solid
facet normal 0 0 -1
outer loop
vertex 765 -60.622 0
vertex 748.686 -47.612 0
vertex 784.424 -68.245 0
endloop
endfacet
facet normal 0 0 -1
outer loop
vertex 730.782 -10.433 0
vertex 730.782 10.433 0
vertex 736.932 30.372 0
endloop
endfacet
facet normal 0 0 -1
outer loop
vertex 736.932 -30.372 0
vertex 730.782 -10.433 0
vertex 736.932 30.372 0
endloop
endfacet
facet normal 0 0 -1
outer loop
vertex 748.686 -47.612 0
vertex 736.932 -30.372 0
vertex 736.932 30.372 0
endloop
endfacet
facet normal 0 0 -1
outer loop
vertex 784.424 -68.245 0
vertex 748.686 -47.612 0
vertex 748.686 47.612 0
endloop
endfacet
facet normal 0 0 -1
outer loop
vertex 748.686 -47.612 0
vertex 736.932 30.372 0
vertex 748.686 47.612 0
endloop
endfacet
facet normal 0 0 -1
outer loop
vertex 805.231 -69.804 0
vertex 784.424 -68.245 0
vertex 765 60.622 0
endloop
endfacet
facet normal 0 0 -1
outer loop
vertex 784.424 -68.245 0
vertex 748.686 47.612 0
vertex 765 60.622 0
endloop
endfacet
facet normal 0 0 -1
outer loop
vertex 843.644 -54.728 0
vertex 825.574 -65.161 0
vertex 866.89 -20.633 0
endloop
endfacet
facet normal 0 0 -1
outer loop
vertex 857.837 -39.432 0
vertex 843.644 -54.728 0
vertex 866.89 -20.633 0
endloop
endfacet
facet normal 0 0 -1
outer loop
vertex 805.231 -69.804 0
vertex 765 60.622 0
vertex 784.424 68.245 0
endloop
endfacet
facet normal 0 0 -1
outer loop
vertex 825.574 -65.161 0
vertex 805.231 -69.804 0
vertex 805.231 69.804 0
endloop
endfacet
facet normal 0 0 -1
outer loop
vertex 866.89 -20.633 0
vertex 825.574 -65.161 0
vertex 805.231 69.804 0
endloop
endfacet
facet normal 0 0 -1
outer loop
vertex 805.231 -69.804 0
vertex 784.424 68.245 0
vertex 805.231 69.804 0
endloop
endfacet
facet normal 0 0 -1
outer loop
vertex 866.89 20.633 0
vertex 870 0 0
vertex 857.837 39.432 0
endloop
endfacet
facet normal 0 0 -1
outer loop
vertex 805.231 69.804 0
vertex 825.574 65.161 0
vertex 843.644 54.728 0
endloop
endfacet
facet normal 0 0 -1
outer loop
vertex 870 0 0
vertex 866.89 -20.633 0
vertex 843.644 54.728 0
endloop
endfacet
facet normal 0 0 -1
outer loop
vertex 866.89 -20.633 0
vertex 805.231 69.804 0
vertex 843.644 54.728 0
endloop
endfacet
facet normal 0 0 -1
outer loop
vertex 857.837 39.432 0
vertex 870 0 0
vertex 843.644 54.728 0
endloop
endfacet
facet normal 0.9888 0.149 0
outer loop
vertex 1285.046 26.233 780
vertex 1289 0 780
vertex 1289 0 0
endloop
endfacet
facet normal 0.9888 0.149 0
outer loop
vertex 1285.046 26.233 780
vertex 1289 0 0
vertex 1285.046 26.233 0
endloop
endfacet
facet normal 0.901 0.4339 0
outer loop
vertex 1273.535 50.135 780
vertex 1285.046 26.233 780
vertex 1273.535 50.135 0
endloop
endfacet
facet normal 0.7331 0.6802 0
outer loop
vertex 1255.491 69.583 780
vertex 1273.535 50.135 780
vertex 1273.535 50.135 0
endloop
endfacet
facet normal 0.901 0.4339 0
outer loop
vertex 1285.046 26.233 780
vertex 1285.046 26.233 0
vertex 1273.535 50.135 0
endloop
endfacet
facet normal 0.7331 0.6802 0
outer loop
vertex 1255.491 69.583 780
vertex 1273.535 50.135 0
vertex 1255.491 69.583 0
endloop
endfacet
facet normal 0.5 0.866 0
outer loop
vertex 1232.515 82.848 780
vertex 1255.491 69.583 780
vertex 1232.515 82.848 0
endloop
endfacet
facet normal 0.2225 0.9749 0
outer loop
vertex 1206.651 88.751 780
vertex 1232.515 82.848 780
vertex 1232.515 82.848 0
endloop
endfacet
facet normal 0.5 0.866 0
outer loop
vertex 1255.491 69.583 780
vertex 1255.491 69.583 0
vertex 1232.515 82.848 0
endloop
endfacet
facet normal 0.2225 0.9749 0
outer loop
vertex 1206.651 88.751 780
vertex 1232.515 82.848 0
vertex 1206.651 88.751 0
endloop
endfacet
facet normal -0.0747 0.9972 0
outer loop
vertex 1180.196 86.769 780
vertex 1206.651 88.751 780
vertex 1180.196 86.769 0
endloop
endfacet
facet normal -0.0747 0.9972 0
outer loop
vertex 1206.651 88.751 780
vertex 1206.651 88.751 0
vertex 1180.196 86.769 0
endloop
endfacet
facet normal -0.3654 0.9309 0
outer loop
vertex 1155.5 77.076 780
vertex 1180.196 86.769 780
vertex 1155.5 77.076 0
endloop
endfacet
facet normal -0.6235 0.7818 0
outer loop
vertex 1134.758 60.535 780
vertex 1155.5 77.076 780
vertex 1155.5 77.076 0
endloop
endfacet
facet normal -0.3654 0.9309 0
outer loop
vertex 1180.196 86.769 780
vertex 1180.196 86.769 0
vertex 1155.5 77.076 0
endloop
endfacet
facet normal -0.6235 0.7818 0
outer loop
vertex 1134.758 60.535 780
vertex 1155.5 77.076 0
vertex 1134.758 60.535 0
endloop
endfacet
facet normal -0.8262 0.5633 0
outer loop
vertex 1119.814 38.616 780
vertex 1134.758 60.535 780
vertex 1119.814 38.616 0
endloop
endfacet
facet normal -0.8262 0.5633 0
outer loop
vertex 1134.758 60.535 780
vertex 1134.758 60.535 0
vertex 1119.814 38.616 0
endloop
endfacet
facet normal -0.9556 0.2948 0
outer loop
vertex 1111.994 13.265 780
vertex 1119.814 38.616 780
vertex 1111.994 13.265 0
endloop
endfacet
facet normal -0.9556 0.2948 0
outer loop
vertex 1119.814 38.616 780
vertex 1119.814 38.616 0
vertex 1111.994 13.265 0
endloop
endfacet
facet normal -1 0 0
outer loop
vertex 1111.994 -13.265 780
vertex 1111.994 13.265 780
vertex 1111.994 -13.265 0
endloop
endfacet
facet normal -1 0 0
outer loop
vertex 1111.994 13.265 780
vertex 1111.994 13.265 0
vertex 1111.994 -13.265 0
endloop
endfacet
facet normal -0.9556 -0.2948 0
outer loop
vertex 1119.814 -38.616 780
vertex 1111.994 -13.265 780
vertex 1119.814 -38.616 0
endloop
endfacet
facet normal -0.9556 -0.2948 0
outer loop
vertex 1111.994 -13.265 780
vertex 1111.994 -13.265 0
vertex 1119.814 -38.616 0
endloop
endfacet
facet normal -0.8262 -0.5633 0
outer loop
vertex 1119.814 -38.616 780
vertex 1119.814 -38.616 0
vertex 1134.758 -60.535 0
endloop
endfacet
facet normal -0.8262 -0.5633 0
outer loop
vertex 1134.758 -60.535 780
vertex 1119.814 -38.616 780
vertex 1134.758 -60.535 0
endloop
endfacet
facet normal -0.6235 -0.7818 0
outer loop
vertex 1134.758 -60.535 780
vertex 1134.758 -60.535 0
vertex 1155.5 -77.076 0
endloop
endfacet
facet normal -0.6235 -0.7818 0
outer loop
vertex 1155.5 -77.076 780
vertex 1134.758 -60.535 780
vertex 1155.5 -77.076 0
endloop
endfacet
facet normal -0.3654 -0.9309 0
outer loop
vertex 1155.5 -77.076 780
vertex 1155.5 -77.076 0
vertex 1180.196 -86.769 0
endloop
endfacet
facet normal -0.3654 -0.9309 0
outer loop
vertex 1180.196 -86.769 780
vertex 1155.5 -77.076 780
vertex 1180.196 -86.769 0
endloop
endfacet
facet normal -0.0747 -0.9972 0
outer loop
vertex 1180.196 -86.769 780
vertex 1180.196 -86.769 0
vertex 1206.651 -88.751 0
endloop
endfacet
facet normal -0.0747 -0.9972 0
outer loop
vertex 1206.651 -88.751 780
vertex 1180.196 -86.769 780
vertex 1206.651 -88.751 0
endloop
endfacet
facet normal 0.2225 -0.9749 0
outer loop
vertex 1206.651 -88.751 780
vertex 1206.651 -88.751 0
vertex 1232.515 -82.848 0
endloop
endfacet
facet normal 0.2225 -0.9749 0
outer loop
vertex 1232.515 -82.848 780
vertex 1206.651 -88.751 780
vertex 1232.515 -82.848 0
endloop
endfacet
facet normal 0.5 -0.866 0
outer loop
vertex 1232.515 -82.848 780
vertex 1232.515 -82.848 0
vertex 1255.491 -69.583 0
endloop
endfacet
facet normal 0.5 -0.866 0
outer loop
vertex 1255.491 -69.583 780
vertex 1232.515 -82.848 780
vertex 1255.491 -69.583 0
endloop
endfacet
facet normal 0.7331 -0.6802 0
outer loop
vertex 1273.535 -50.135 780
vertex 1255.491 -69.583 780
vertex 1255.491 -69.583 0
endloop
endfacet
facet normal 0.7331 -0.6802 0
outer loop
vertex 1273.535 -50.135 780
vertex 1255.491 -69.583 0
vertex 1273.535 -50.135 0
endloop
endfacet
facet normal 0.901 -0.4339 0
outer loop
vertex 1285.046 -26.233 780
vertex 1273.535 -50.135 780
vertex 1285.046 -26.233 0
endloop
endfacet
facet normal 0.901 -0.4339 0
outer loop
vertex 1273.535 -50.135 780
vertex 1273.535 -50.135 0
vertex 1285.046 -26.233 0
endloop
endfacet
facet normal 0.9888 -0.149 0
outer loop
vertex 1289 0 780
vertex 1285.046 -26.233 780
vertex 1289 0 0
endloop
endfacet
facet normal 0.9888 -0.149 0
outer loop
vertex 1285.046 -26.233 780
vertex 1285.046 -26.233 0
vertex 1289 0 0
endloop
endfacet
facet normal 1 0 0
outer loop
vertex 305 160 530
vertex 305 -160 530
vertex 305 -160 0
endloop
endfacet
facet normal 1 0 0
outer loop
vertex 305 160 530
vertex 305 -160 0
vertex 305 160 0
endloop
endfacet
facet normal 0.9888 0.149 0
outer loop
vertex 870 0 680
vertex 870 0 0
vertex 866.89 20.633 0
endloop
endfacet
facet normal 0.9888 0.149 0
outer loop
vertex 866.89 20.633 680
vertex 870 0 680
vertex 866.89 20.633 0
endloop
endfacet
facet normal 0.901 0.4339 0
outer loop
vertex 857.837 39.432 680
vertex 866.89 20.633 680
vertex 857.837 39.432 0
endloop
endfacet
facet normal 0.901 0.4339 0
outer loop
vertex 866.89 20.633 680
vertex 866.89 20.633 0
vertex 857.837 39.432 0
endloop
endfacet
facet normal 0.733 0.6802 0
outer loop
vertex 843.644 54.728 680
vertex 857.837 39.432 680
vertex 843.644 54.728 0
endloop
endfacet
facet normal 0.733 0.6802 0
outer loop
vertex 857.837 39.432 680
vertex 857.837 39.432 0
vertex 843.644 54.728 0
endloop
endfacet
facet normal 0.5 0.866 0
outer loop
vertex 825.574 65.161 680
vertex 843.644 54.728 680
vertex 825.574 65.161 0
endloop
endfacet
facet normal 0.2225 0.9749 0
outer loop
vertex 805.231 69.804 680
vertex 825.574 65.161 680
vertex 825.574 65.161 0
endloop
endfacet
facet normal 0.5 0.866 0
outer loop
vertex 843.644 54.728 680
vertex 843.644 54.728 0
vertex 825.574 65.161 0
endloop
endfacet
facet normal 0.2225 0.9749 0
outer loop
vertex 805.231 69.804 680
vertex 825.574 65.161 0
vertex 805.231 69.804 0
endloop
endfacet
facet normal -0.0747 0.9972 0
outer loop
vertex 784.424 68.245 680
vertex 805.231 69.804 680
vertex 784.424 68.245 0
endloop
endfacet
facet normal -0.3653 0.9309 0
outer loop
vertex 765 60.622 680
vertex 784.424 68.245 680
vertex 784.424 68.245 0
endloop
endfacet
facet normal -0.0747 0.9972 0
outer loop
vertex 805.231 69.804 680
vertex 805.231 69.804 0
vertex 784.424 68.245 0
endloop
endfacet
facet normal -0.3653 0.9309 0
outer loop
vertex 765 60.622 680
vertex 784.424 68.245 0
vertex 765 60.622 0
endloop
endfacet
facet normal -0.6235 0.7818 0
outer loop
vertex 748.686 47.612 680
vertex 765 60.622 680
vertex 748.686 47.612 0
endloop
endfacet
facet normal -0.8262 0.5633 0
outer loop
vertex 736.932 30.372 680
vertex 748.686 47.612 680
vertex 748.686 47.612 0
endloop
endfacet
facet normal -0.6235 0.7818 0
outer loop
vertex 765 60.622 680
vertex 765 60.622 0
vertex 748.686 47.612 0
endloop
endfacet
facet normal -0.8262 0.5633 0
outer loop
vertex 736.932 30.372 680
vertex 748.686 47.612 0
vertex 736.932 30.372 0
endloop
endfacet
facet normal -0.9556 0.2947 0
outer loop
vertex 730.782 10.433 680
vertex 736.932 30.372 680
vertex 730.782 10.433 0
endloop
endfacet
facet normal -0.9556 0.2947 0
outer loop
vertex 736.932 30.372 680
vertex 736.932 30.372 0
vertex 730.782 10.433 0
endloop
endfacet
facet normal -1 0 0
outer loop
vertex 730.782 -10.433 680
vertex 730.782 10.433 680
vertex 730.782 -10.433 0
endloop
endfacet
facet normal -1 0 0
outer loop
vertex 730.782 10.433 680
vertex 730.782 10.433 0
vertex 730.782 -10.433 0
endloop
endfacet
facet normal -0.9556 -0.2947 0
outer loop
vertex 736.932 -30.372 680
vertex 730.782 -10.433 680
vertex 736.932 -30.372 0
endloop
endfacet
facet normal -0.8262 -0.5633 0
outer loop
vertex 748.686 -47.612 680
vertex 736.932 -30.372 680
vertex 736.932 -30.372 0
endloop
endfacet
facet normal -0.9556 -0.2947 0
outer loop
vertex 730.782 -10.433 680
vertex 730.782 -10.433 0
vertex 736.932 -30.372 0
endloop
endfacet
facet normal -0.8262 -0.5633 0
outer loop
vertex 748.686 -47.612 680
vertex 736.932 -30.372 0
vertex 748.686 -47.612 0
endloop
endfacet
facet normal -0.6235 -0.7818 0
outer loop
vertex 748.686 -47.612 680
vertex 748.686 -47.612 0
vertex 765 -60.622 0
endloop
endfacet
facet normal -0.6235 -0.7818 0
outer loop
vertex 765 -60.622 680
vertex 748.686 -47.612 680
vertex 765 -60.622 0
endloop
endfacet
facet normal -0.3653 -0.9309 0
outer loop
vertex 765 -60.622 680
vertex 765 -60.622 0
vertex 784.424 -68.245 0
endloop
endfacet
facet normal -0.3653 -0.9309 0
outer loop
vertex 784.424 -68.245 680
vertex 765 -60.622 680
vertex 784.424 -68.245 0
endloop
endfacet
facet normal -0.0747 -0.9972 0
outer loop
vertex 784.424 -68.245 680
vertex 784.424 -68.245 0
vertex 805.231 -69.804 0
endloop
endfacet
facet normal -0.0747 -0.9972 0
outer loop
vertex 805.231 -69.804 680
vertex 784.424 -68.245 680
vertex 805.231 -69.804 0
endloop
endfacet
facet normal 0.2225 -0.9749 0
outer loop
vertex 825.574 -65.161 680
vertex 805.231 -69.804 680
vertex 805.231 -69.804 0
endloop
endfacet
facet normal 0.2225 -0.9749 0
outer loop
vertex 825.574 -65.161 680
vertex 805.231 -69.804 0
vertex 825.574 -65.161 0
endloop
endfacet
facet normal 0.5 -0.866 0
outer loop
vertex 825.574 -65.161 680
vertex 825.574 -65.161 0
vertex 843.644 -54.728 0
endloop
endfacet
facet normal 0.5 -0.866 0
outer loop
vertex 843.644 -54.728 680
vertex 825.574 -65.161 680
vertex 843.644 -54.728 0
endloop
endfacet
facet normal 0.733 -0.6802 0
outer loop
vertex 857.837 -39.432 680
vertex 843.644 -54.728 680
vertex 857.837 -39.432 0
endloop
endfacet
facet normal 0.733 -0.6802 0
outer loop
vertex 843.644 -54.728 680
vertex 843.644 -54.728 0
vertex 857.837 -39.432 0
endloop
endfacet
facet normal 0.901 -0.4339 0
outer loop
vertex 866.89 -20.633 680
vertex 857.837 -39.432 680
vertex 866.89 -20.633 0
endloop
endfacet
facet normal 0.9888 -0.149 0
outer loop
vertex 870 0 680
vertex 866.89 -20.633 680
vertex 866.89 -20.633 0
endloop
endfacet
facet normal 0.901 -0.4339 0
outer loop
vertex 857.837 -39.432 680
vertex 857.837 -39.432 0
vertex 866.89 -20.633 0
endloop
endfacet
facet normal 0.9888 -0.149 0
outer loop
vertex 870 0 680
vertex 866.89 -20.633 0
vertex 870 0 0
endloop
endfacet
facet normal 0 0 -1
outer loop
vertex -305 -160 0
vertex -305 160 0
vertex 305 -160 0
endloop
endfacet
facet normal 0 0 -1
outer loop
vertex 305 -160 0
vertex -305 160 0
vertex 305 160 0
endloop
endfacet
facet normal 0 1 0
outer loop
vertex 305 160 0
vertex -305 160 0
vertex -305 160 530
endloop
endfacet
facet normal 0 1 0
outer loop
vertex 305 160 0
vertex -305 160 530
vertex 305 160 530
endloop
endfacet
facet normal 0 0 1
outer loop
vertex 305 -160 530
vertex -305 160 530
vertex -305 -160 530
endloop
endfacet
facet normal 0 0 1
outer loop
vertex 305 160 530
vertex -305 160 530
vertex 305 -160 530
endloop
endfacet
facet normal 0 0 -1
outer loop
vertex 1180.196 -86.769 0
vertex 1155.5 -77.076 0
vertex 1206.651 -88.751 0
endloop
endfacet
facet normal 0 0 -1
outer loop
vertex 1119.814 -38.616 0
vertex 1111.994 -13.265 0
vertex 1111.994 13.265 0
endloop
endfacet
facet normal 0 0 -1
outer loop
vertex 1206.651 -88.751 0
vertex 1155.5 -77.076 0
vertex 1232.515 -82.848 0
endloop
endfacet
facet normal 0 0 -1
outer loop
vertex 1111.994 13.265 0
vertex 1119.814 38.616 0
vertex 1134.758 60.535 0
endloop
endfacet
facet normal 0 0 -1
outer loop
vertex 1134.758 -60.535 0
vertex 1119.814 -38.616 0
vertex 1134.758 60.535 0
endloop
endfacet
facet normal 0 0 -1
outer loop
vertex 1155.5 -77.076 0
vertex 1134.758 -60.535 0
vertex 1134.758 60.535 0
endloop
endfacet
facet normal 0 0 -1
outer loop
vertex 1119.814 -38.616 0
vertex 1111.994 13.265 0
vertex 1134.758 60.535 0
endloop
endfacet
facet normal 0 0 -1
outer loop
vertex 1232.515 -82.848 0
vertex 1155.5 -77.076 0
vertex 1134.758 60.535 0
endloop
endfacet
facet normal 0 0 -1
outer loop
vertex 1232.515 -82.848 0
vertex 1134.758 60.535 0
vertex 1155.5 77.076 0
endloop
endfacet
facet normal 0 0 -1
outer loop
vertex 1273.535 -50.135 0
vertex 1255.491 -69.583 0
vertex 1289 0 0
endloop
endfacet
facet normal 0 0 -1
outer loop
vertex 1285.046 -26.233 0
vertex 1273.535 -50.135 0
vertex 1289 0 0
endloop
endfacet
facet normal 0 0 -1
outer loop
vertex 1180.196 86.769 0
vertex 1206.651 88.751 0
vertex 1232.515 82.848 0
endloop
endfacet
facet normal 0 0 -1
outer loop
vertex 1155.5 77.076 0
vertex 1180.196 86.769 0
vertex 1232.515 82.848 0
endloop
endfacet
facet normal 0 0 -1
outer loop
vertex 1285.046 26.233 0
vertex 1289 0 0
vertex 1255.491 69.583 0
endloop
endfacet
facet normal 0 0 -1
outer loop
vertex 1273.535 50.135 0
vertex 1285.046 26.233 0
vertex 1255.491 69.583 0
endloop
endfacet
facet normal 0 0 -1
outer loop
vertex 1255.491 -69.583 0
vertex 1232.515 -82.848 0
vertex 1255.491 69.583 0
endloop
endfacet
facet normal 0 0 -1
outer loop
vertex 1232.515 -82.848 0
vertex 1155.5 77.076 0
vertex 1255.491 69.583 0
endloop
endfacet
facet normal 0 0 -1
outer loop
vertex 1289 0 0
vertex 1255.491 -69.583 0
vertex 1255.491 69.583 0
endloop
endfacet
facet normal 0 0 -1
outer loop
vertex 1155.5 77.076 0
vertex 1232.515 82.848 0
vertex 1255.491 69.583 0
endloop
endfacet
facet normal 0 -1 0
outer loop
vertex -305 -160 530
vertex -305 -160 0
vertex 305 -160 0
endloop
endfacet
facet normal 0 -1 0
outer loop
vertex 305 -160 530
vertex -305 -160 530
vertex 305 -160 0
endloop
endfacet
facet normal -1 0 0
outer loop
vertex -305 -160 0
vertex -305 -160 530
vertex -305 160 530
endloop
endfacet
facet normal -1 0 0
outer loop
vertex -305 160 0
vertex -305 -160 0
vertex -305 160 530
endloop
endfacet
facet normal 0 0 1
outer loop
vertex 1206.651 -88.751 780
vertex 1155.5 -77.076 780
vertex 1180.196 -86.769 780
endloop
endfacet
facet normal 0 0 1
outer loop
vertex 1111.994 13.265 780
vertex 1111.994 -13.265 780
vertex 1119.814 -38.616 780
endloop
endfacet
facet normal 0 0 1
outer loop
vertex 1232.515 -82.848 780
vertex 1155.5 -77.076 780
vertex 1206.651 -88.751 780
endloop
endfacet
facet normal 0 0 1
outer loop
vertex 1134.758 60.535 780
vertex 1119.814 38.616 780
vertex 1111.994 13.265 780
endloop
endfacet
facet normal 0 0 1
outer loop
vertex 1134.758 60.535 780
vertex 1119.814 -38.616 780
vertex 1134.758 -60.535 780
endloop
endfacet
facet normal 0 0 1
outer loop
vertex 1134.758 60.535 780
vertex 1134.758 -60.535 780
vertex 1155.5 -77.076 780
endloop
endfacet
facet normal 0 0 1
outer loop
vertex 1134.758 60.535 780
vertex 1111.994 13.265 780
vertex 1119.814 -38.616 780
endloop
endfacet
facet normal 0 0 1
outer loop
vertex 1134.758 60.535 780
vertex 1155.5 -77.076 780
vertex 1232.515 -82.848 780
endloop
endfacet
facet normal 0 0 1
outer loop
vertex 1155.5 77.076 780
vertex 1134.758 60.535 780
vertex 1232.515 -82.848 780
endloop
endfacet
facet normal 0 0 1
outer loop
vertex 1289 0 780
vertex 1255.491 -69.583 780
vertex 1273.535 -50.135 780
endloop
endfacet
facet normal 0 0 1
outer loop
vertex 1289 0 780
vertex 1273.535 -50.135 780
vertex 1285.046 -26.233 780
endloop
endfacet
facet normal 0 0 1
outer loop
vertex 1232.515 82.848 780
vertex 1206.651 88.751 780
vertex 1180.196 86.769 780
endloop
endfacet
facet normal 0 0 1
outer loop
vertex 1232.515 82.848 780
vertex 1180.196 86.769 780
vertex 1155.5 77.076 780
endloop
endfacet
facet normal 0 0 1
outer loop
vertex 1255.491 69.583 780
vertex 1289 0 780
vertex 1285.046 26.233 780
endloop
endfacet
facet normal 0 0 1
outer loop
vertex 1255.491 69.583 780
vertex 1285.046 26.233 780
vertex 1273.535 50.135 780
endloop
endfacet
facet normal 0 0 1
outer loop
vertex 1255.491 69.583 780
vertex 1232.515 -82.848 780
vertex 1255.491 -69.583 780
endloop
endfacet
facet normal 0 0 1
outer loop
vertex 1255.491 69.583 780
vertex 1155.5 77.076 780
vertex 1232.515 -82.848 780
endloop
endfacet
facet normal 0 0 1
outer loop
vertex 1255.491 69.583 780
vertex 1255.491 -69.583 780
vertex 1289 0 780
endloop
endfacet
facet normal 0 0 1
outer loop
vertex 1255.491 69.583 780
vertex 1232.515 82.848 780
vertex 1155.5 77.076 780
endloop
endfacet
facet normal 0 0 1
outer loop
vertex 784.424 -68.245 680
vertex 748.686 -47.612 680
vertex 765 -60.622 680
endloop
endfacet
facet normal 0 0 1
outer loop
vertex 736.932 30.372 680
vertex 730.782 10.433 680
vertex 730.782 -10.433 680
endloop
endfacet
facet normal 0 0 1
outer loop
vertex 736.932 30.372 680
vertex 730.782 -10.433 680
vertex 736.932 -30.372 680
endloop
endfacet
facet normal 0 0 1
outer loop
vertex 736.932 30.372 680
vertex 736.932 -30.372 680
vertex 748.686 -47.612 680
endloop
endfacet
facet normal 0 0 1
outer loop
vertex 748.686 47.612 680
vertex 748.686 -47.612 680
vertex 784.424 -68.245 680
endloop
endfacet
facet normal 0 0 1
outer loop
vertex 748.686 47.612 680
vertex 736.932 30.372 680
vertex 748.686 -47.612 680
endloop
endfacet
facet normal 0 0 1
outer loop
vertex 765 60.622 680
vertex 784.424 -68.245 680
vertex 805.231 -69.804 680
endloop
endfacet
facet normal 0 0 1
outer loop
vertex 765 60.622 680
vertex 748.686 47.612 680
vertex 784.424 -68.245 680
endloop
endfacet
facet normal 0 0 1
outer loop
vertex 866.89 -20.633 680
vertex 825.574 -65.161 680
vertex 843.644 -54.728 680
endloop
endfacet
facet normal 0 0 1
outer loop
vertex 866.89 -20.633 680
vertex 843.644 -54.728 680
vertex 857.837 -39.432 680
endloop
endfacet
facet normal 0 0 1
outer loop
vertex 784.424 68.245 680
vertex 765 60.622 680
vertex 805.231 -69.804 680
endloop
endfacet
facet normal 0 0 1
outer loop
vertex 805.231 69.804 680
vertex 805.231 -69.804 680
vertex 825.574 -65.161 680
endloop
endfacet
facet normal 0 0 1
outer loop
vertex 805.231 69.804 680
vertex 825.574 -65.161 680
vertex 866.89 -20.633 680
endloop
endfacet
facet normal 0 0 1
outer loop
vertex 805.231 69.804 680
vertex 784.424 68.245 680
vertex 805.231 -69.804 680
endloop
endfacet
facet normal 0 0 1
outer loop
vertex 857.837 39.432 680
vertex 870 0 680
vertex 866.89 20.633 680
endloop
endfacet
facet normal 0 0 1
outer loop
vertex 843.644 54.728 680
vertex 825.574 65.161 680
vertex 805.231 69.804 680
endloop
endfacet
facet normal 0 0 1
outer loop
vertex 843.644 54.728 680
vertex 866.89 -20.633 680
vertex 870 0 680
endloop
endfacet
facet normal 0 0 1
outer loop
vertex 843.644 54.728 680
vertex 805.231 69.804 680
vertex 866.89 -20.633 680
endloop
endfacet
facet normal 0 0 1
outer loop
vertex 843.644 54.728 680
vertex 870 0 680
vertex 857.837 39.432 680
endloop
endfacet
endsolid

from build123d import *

# Parameters (mm, degrees)
F0_W     = 610
F0_H     = 320
F1_DEPTH = 530
F2_R     = 70
F3_DEPTH = 680
F2_R_2   = 89
F4_DEPTH = 780


with BuildPart() as f1:
    # F0 (on Top) → F1 (new body)
    with BuildSketch(Plane.XY):
        Rectangle(F0_W, F0_H)
    extrude(amount=F1_DEPTH)


with BuildPart() as f3:
    # F2 (on Top) → F3 (new body)
    with BuildSketch(Plane.XY):
        with Locations((800, 0)):
            Circle(F2_R)
    extrude(amount=F3_DEPTH)


with BuildPart() as f4:
    # F2 (on Top) → F4 (new body)
    with BuildSketch(Plane.XY):
        with Locations((1200, 0)):
            Circle(F2_R_2)
    extrude(amount=F4_DEPTH)


solid = Compound([f1.part, f3.part, f4.part])
